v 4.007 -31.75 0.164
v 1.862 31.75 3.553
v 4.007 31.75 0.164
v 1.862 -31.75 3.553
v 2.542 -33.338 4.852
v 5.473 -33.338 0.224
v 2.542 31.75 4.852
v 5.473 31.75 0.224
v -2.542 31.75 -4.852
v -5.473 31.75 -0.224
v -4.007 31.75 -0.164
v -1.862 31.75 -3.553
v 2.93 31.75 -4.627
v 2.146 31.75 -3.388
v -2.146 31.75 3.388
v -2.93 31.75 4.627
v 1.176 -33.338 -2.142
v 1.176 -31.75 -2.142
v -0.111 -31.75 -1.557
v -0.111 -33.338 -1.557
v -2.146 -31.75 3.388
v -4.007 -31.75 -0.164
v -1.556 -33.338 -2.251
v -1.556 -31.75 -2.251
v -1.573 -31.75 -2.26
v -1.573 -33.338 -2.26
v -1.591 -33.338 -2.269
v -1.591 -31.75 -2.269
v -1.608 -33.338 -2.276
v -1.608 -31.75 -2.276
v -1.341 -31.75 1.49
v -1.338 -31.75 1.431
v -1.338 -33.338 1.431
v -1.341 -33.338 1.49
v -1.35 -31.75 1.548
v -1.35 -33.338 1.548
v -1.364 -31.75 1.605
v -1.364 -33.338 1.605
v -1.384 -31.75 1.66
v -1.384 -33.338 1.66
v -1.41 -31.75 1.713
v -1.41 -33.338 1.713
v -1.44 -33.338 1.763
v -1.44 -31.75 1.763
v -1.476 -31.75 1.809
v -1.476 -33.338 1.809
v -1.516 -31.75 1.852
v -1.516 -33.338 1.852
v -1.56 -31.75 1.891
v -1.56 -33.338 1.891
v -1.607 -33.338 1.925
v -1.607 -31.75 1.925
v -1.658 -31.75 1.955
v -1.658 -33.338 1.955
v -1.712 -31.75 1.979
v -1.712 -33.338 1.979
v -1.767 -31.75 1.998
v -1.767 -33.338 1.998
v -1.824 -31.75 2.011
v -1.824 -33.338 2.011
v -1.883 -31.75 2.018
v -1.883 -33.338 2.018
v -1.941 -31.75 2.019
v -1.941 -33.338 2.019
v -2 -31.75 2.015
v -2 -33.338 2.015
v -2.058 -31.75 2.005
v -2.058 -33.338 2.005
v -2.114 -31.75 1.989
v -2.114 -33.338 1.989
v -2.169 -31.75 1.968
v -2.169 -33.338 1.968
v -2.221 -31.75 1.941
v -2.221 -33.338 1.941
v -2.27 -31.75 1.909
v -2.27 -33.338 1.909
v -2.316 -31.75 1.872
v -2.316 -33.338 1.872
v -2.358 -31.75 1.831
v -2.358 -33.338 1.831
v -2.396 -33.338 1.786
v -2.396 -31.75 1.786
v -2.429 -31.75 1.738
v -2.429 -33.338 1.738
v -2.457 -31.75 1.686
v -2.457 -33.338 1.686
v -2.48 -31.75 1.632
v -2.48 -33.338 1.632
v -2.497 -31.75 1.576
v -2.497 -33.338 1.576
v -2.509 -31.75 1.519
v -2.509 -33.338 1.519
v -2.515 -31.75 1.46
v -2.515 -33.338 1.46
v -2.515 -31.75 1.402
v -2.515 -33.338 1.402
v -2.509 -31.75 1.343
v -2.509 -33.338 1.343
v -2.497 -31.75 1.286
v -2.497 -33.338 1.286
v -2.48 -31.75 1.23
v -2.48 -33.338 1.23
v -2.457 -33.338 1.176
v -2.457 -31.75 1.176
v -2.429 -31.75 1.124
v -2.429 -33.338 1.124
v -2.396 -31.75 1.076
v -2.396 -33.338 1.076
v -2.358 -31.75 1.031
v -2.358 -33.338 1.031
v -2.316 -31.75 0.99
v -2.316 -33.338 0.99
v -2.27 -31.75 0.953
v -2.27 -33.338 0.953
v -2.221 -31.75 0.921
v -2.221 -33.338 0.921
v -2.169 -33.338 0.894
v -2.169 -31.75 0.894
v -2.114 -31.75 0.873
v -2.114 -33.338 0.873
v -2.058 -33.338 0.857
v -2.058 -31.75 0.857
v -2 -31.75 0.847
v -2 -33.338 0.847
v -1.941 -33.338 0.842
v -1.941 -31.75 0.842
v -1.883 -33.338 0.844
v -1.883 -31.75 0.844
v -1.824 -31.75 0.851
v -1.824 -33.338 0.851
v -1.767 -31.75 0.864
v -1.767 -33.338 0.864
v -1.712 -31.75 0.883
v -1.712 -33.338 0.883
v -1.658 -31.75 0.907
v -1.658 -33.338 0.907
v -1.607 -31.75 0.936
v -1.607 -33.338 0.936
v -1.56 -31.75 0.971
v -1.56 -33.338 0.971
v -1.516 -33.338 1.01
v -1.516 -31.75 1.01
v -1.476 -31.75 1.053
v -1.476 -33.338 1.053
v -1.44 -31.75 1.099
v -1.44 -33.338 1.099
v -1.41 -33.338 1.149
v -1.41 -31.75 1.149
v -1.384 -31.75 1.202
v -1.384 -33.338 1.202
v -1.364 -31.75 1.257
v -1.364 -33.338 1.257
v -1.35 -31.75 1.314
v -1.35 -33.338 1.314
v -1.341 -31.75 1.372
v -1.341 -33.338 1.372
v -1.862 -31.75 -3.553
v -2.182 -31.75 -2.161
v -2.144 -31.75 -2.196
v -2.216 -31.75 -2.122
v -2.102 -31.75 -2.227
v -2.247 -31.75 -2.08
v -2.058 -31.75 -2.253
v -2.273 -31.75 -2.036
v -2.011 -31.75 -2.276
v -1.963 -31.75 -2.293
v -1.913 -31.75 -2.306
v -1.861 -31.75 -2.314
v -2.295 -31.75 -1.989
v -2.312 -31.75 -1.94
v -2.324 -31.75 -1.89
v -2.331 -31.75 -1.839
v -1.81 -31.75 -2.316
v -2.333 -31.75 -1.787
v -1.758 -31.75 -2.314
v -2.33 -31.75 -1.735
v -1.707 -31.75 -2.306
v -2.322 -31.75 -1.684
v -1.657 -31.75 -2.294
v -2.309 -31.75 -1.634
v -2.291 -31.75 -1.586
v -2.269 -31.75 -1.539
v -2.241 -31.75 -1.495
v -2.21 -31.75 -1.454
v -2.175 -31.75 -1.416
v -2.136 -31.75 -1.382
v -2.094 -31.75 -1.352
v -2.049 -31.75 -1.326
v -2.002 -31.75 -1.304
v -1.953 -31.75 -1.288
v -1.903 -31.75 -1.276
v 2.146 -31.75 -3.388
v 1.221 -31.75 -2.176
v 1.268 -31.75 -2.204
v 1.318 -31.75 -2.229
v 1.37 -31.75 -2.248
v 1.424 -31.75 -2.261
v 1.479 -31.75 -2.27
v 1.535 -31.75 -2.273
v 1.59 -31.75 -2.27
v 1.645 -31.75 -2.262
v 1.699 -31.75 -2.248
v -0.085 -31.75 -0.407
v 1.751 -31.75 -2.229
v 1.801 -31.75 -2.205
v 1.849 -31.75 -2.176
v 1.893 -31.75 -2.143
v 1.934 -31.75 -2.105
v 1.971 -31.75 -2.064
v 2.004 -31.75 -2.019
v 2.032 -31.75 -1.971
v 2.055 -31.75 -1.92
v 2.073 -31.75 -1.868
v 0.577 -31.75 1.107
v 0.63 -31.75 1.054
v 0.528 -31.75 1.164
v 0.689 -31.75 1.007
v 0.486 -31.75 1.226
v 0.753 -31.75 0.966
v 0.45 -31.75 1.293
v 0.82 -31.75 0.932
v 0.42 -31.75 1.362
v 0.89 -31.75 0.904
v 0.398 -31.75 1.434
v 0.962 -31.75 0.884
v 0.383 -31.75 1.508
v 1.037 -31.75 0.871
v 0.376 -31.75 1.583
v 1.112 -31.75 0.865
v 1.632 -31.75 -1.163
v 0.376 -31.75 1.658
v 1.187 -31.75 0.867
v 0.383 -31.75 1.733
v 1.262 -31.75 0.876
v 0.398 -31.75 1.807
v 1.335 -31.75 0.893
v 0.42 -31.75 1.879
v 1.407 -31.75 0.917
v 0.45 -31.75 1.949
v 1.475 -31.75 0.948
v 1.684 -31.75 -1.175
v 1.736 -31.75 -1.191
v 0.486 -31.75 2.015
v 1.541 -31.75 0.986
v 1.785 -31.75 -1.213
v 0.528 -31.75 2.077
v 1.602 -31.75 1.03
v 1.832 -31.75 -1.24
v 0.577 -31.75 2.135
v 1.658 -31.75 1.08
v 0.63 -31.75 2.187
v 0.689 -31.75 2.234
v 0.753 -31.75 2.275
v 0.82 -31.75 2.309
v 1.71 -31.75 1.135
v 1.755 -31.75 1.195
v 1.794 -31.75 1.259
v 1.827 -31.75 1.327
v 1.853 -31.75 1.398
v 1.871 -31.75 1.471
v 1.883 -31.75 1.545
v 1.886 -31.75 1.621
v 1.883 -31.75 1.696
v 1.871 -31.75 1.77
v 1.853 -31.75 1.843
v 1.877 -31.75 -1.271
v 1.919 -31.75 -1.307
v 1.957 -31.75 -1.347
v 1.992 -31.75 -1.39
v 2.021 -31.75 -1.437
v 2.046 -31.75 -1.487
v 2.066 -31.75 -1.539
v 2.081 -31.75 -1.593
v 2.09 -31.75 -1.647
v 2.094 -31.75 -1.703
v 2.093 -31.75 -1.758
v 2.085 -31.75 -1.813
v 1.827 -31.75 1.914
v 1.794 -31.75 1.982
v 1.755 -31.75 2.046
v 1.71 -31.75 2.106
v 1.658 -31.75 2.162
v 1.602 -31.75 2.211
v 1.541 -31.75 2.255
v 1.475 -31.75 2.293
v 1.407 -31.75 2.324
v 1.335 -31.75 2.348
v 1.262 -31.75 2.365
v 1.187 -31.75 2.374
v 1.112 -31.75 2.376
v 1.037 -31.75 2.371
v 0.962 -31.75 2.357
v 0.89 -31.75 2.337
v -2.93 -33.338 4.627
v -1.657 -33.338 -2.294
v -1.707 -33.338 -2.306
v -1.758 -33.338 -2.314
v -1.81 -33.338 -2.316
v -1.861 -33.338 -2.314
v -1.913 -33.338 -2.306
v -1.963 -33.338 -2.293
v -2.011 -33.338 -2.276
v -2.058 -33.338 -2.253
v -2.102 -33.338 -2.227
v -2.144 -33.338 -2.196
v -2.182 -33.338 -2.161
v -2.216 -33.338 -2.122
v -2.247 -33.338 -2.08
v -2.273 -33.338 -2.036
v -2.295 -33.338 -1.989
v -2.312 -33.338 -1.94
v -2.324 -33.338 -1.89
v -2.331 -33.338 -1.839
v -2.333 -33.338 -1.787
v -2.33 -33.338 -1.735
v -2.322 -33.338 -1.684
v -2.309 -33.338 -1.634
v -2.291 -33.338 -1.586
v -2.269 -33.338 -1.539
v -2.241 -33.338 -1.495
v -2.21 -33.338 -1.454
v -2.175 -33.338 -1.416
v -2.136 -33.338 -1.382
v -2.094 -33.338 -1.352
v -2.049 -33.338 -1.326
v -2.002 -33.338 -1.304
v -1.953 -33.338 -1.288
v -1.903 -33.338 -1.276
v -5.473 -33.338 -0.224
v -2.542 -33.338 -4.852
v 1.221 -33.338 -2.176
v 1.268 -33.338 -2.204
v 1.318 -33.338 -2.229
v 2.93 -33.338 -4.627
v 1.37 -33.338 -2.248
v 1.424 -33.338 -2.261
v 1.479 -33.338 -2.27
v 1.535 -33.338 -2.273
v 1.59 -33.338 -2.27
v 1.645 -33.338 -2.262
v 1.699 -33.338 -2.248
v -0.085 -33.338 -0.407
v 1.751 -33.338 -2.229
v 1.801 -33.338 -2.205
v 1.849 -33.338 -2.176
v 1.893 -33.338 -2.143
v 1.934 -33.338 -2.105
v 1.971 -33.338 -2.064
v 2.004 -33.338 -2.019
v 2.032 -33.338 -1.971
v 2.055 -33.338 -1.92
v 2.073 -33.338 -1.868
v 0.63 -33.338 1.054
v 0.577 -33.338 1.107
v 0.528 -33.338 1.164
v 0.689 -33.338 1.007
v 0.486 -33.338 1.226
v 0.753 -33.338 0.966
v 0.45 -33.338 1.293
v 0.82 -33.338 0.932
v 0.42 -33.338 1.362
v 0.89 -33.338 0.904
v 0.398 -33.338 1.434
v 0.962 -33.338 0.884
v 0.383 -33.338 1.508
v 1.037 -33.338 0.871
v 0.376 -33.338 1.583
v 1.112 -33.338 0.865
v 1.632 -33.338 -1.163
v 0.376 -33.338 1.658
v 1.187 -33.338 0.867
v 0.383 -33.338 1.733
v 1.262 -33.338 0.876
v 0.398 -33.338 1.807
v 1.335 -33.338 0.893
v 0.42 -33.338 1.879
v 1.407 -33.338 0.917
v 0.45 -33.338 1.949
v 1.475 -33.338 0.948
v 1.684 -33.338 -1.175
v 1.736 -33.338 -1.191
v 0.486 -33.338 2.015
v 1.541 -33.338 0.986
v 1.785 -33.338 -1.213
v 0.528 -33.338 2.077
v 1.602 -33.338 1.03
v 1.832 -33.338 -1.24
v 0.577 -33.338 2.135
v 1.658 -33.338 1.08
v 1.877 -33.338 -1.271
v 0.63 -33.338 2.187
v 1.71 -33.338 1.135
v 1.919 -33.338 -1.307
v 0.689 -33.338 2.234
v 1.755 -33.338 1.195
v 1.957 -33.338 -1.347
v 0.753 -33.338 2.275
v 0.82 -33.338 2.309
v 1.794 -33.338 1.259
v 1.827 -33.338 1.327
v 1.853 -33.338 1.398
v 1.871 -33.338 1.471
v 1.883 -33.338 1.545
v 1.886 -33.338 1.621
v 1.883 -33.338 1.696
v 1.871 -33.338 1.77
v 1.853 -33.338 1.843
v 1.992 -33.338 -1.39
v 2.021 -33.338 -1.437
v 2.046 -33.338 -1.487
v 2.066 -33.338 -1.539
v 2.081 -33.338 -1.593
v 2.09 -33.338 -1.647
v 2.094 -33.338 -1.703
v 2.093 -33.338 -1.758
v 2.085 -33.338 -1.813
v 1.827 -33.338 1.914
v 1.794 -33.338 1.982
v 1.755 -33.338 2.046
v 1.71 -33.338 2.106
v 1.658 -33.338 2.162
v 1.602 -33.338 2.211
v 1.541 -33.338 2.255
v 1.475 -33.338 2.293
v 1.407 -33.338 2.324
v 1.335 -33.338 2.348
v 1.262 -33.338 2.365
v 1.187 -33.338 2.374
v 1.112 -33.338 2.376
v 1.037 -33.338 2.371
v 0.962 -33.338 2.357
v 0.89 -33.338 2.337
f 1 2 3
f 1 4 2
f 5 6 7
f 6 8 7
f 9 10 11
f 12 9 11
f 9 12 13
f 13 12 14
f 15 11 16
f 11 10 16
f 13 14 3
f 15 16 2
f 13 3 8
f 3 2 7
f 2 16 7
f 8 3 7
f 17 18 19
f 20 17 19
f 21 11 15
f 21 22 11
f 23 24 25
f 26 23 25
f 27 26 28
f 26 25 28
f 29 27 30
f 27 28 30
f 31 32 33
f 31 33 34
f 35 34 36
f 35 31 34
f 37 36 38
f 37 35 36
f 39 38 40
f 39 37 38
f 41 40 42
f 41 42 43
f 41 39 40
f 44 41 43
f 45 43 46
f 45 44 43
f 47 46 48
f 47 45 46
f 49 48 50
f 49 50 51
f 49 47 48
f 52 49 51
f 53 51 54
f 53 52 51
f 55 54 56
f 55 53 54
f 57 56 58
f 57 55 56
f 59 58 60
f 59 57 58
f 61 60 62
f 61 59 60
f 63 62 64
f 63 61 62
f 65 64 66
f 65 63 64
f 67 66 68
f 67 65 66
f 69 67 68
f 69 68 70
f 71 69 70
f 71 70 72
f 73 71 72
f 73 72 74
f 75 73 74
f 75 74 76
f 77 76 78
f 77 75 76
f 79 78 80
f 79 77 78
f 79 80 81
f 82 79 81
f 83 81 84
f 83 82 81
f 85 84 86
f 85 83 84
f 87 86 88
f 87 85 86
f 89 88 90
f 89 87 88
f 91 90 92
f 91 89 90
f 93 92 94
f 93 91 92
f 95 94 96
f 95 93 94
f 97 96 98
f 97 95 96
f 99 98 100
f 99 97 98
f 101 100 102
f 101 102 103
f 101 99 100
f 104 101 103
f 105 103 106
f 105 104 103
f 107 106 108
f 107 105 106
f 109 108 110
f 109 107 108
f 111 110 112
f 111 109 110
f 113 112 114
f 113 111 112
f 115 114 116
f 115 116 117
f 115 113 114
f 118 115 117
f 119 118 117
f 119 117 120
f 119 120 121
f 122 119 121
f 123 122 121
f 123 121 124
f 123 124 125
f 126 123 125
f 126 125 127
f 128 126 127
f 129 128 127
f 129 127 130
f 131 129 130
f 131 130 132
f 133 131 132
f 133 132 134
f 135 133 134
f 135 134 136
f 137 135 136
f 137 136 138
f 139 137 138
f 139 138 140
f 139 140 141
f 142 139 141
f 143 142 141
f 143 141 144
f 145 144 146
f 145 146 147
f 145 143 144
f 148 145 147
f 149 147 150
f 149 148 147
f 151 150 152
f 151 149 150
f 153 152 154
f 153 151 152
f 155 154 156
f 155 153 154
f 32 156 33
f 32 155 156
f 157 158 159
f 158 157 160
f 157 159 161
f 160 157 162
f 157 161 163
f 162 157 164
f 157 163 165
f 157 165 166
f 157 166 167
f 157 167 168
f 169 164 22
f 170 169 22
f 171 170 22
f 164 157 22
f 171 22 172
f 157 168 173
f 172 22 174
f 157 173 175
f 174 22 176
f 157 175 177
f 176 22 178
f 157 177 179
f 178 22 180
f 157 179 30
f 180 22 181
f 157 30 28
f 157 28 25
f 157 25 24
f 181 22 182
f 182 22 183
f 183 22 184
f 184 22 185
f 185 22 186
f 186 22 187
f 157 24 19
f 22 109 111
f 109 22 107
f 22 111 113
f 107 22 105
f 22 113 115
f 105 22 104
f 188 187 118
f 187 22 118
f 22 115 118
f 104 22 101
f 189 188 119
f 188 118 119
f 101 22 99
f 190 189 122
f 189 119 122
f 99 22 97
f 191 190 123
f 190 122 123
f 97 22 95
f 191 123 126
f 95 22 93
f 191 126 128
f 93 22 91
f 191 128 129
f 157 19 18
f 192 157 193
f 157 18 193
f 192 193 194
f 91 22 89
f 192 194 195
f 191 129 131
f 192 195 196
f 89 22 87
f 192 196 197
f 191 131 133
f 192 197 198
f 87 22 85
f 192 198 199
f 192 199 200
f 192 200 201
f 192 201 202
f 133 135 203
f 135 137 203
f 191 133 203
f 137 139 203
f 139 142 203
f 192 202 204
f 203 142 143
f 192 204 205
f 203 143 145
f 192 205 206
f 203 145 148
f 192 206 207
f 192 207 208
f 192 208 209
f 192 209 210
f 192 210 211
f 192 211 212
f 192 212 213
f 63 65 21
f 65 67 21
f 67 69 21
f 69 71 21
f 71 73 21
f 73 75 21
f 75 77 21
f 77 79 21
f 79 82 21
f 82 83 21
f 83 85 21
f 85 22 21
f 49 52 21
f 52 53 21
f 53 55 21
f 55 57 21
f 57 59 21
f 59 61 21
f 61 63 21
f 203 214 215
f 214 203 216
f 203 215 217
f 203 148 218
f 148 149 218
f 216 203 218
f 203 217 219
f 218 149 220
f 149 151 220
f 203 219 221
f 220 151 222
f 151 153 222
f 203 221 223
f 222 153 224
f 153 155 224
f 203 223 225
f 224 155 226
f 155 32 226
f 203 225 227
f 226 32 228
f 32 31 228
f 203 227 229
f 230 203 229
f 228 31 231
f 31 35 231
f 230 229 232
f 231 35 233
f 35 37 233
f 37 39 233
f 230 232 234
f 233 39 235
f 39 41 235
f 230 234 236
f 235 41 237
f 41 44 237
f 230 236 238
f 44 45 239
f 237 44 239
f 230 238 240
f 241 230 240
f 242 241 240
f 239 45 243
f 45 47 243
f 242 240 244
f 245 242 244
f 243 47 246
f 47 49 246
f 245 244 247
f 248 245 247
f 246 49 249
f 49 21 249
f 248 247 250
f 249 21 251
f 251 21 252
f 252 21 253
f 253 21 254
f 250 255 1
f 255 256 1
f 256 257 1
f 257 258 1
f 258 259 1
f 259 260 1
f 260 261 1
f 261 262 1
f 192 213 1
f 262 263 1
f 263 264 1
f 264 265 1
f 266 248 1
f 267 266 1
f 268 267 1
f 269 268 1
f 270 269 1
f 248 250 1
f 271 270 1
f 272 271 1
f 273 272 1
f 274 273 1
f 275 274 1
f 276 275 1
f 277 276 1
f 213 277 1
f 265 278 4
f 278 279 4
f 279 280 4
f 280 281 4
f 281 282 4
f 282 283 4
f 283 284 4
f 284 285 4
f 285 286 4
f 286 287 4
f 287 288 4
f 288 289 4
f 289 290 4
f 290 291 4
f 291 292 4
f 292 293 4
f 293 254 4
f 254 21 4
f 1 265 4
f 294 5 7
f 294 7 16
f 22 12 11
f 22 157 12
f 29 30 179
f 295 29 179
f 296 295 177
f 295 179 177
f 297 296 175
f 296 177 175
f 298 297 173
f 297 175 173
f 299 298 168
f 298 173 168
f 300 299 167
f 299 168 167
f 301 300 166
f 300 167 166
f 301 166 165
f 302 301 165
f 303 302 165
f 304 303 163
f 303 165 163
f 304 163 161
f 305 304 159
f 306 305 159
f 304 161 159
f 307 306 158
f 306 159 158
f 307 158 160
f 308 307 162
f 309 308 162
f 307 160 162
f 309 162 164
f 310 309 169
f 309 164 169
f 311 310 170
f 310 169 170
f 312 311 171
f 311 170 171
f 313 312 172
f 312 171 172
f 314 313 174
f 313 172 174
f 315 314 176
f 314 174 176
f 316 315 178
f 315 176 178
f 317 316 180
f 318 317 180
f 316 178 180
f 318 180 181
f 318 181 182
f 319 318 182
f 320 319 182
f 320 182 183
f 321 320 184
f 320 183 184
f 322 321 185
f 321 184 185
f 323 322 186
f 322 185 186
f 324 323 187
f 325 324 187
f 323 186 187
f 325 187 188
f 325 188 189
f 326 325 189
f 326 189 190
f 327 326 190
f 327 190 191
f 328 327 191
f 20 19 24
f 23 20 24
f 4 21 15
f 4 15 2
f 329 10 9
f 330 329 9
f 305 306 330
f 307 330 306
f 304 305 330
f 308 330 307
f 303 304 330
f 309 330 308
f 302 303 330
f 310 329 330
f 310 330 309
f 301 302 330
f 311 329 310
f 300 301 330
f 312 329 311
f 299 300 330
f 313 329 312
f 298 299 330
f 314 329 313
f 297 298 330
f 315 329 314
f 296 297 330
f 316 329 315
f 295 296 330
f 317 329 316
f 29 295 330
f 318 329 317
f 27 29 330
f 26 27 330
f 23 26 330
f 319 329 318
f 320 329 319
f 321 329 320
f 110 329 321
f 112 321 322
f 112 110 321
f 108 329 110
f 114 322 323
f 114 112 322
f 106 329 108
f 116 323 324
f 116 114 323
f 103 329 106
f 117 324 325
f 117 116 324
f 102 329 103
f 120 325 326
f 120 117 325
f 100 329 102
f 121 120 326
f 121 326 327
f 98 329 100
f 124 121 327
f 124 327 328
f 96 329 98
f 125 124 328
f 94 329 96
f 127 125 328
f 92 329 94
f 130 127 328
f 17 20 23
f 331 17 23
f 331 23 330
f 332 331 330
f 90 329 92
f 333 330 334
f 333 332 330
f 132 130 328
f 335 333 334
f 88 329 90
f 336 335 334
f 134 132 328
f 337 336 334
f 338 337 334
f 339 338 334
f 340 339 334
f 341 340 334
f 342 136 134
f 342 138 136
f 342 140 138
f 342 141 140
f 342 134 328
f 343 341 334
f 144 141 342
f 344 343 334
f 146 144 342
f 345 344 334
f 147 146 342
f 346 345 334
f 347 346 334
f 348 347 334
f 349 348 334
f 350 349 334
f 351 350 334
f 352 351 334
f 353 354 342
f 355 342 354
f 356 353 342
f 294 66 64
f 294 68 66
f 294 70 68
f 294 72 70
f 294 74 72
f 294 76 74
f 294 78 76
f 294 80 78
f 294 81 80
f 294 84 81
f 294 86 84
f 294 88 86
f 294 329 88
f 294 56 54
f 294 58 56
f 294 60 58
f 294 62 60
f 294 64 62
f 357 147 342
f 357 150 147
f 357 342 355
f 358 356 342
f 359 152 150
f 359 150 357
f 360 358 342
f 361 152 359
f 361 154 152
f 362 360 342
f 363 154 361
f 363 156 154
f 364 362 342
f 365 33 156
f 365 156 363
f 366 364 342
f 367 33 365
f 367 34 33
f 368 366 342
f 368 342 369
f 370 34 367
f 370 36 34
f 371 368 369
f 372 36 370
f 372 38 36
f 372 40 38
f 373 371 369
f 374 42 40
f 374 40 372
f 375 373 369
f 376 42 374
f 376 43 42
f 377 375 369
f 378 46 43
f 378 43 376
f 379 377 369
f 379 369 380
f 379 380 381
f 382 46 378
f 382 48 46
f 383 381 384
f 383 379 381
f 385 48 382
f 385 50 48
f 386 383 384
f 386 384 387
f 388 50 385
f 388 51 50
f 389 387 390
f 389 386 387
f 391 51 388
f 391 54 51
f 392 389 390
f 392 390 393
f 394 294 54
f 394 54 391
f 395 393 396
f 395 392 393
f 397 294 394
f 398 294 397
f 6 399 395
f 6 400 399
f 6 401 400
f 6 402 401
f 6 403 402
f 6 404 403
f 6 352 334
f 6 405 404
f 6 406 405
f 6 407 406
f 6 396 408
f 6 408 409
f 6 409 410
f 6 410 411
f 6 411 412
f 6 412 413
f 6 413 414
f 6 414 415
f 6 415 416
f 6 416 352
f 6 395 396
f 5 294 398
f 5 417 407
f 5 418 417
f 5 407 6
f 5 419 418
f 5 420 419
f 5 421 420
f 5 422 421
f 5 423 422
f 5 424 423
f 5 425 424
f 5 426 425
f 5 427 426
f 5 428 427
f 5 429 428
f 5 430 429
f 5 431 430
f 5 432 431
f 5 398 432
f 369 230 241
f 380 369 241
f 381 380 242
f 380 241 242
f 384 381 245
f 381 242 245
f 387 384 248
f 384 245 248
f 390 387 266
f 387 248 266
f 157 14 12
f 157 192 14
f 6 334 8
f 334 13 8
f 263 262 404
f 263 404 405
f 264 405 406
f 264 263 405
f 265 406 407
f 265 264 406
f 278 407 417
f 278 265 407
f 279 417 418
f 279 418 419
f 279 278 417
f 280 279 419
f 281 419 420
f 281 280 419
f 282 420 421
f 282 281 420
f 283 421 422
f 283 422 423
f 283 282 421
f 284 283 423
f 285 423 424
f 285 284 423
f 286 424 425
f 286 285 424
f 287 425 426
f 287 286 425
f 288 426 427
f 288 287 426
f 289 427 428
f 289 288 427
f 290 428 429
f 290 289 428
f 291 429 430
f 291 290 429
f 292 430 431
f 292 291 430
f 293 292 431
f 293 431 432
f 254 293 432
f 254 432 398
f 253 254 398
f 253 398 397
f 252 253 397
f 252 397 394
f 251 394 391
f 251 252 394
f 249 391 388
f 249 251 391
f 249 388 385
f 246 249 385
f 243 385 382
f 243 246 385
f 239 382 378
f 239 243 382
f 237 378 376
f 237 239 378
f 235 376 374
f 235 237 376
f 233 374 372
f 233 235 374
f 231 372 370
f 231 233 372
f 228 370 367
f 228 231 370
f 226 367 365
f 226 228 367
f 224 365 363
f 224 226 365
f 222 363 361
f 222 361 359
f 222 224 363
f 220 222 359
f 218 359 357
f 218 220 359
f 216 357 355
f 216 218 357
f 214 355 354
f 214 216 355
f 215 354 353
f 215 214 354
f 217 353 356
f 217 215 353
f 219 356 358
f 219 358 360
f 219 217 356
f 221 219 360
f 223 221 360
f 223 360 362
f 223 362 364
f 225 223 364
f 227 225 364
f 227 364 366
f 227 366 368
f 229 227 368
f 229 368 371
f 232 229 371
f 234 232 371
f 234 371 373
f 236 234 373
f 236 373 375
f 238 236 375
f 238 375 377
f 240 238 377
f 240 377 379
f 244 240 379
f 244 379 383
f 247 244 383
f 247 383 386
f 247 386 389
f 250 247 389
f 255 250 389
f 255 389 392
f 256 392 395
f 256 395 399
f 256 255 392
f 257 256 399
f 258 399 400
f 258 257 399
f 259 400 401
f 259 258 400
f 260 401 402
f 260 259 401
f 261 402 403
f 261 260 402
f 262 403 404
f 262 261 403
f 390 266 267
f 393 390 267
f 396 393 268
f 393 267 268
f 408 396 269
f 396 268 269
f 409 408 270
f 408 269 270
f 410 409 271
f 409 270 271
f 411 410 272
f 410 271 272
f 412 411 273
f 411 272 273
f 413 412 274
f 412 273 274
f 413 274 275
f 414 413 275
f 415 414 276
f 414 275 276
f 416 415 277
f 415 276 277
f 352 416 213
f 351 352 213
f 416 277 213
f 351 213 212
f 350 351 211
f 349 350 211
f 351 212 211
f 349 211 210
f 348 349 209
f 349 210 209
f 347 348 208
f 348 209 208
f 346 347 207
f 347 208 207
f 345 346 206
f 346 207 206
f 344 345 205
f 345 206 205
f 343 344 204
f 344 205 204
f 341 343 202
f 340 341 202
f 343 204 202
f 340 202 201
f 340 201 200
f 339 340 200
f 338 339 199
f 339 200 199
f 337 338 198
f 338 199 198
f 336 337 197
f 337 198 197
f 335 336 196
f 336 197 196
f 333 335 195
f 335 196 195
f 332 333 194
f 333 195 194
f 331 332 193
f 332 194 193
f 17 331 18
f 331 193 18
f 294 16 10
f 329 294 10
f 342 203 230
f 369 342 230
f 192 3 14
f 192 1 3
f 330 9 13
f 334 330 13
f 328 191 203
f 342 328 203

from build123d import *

# Parameters (mm, degrees)
F1_DEPTH = 31.75
F2_R     = 0.5886867957
F2_R_2   = 0.7557919615
F3_DEPTH = 1.5875


with BuildPart() as f1:
    # F0 (on Front) → F1 (new body, symmetric)
    with BuildSketch(Plane.XZ):
        Polygon((5.4726746476, 0.2241786608), (2.5421929086, 4.8515646018), (-2.930481739, 4.6273859411), (-5.4726746476, -0.2241786608), (-2.5421929086, -4.8515646018), (2.930481739, -4.6273859411), align=None)
        Polygon((-2.1458815411, 3.3884606556), (1.8615522369, 3.5526182559), (4.0074337781, 0.1641576003), (2.1458815411, -3.3884606556), (-1.8615522369, -3.5526182559), (-4.0074337781, -0.1641576003), align=None, mode=Mode.SUBTRACT)
    extrude(amount=F1_DEPTH, both=True)

    # F2 (on face) → F3 (join)
    with BuildSketch(Plane.XZ.offset(31.75)):
        Polygon((-2.5421929086, -4.8515646018), (2.930481739, -4.6273859411), (5.4726746476, 0.2241786608), (2.5421929086, 4.8515646018), (-2.930481739, 4.6273859411), (-5.4726746476, -0.2241786608), align=None)
        Polygon((-1.8615522369, -3.5526182559), (-4.0074337781, -0.1641576003), (-2.1458815411, 3.3884606556), (1.8615522369, 3.5526182559), (4.0074337781, 0.1641576003), (2.1458815411, -3.3884606556), align=None, mode=Mode.SUBTRACT)
        Polygon((-2.1458815411, 3.3884606556), (-4.0074337781, -0.1641576003), (-1.8615522369, -3.5526182559), (2.1458815411, -3.3884606556), (4.0074337781, 0.1641576003), (1.8615522369, 3.5526182559), align=None)
        with BuildLine():
            ThreePointArc((-1.6080282877, -2.2762045416), (-2.3121206431, -1.9400866098), (-1.90285574, -1.2758400079))
            Line((-1.90285574, -1.2758400079), (-0.0846300536, -0.4070492287))
            Line((-0.0846300536, -0.4070492287), (1.6315181704, -1.1626920101))
            ThreePointArc((1.6315181704, -1.1626920101), (1.7606026884, -1.201756272), (1.8765772228, -1.270594755))
            ThreePointArc((1.8765772228, -1.270594755), (1.9710769764, -2.063707268), (1.1761976946, -2.1419670217))
            Line((1.1761976946, -2.1419670217), (-0.1107579301, -1.5566768125))
            Line((-0.1107579301, -1.5566768125), (-1.5564763423, -2.2514307564))
            ThreePointArc((-1.5564763423, -2.2514307564), (-1.5819143346, -2.2645209548), (-1.6080282877, -2.2762045416))
        make_face(mode=Mode.SUBTRACT)
        with Locations((-1.9266997697, 1.430987264)):
            Circle(F2_R, mode=Mode.SUBTRACT)
        with Locations((1.1305541266, 1.6205844004)):
            Circle(F2_R_2, mode=Mode.SUBTRACT)
    extrude(amount=F3_DEPTH)


solid = f1.part
